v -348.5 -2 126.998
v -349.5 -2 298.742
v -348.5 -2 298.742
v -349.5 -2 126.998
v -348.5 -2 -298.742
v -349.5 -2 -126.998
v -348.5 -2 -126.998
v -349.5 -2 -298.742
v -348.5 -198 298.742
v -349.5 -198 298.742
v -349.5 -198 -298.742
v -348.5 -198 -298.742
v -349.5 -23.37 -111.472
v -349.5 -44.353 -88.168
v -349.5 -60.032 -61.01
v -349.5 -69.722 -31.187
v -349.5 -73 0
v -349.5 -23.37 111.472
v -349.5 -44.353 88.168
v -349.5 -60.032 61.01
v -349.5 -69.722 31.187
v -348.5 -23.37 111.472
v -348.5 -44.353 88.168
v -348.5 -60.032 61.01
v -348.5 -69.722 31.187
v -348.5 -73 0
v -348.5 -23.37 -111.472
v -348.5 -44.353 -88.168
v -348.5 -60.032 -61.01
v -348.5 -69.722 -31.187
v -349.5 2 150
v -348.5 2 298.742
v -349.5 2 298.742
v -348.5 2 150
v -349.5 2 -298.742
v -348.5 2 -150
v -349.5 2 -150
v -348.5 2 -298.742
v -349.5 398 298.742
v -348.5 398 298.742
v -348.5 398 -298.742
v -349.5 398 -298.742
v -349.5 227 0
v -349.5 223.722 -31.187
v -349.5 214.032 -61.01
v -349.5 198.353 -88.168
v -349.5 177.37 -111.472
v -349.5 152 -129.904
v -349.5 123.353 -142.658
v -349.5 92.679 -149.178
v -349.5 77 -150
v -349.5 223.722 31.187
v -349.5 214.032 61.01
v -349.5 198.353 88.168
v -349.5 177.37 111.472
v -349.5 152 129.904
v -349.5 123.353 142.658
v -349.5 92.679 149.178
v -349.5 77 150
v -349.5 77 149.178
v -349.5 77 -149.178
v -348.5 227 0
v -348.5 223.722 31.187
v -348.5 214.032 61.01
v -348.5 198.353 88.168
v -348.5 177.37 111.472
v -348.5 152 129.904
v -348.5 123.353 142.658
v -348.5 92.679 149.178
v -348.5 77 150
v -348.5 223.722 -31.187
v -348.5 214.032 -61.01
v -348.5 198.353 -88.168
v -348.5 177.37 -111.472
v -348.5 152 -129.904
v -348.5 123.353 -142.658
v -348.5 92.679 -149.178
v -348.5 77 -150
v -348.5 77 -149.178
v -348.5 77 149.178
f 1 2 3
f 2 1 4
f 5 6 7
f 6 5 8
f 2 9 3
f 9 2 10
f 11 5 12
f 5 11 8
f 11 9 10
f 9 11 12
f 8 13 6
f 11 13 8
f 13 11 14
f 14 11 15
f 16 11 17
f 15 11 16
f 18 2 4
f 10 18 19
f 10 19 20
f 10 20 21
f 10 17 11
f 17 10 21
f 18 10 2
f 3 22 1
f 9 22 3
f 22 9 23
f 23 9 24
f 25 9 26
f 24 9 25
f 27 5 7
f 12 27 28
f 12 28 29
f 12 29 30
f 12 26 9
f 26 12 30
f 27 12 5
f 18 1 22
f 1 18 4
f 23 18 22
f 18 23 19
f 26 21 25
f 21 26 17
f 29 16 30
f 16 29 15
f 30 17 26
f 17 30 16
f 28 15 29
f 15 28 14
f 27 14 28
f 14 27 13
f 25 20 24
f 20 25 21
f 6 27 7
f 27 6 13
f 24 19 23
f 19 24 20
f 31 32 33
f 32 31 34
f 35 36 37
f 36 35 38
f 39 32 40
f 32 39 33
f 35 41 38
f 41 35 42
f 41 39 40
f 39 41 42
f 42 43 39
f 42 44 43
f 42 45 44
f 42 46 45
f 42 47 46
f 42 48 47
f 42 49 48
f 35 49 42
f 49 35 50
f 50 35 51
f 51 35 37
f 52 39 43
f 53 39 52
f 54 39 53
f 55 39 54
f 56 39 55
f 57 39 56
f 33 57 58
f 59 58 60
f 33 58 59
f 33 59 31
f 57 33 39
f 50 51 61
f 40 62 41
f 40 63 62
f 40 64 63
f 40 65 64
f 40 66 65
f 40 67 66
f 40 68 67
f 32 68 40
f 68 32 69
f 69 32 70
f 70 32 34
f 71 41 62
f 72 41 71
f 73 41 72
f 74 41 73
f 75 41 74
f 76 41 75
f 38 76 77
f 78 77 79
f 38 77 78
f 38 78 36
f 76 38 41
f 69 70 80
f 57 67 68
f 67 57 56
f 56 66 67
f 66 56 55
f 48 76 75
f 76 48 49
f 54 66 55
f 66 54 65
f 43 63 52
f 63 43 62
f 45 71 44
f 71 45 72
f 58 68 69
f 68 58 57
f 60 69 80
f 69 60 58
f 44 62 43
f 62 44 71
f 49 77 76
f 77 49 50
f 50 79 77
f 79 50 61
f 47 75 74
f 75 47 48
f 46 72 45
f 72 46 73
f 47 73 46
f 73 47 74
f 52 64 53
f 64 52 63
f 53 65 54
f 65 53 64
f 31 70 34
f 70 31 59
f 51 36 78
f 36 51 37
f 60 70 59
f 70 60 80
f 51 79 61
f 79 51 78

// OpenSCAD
// file: parameters.scad
cm = 10;

//The dimensions of all other components depend on those of the square absorbers
square_absorber_height=9.8*cm;
square_absorber_width=9.6*cm;
square_absorber_thickness=2*cm;

square_absorber_horizontal_gap=0.4*cm;
square_absorber_vertical_gap=0.1897*cm;
square_absorber_longitudinal_gap=0.34*cm;

// holes in the square absorbers, cblocks, and master plates for placing connector pins.  
conn_hole_spacing=5*cm;
conn_hole_depth=1*cm;
conn_hole_radius=0.25*cm;

// BPC total dimensions
bpc_length=150*cm;
bpc_first_hole_radius=15.00*cm;
bpc_last_hole_radius=17.25*cm;
bpc_layer_thickness=square_absorber_thickness+square_absorber_longitudinal_gap;
//bpc_nlayers=floor(bpc_length/bpc_layer_thickness);
bpc_nlayers=51;
function bpc_hole_radius(i)=bpc_first_hole_radius+(bpc_last_hole_radius-bpc_first_hole_radius)*i/(bpc_nlayers-1);
bpc_outer_gap=0.4*cm;

tanBeamTilt=0.0243;
beamXAtUpstream=7.7*cm;
function bpc_hole_position(i)=tanBeamTilt*i*bpc_layer_thickness+beamXAtUpstream;

nsquaresX=3;



//scintillator
scint_thickness=0.3*cm;
scint_height=square_absorber_height*6+5*square_absorber_vertical_gap;
scint_width=square_absorber_width*nsquaresX+nsquaresX*square_absorber_horizontal_gap-bpc_outer_gap;
scint_inner_gap=square_absorber_horizontal_gap/2;



//cells in scintillator (also defines placement of sensors on pcb)
scint_cell_center_min_distance_from_edge=.35*cm;
scint_cell_dphi=9; //degrees
scint_cell_dr=2.5*cm;

//pcb
//pcb_thickness=.236*cm;
pcb_thickness=.16*cm;
pcb_height=square_absorber_height*6+5*square_absorber_vertical_gap;
pcb_width=square_absorber_width*nsquaresX+nsquaresX*square_absorber_horizontal_gap-bpc_outer_gap;
pcb_inner_gap=square_absorber_horizontal_gap/2;

// ESR film
ESR_film_thickness=0.015*cm;

//air gap
air_gap_thickness=0.02*cm;

//cover
cover_thickness=0.2*cm;
cover_height=square_absorber_height*6+5*square_absorber_vertical_gap;
cover_width=square_absorber_width*nsquaresX+nsquaresX*square_absorber_horizontal_gap-bpc_outer_gap;
cover_inner_gap=square_absorber_horizontal_gap/2;

//cblock
cblock_thickness=bpc_layer_thickness-pcb_thickness-scint_thickness-2*air_gap_thickness-2*ESR_film_thickness-cover_thickness;
cblock_height=square_absorber_height*6+5*square_absorber_vertical_gap;
cblock_width=square_absorber_width*nsquaresX+nsquaresX*square_absorber_horizontal_gap-bpc_outer_gap;
cblock_inner_gap=square_absorber_horizontal_gap/2;


//longitudinal positions of the first layer
cblock_position=cblock_thickness/2;
cover_position=cblock_thickness+air_gap_thickness+cover_thickness/2;
scint_position=cblock_thickness+air_gap_thickness+cover_thickness+ESR_film_thickness+scint_thickness/2;
pcb_position=cblock_thickness+air_gap_thickness+cover_thickness+ESR_film_thickness+scint_thickness+ESR_film_thickness+pcb_thickness/2;
echo(cblock_thickness);
// main file
include<parameters.scad>

ecal_height=pcb_height;
ecal_width=pcb_width;
ecal_inner_gap=pcb_inner_gap;

wscfi_thickness=17*cm;
wscfi_position=-wscfi_thickness/2;

lightguides_thickness=2.5*cm;
lightguides_position=-wscfi_thickness-lightguides_thickness/2;

lightguides_thickness=2.5*cm;
lightguides_position=-wscfi_thickness-lightguides_thickness/2;

//0.1 cm Al + 10.15 cm air + .25 cm PCB
ecal_pcb_thickness=0.25*cm;
ecal_pcb_position=lightguides_position-lightguides_thickness/2-ecal_pcb_thickness/2;

ecal_air_thickness=10.15*cm;
ecal_air_position=ecal_pcb_position-ecal_air_thickness/2-ecal_air_thickness/2;

ecal_cover_thickness=0.1*cm;
ecal_cover_position=ecal_air_position-ecal_air_thickness/2-ecal_cover_thickness/2;

module ecal_component_side(hole_radius=bpc_hole_radius(0),thickness=17*cm, height=pcb_height, width=ecal_width,inner_gap=ecal_inner_gap, holePosition=bpc_hole_position(0))
{   
    epsilon=0.1*cm;
    sipm_width=0.6*cm;
    sipm_height=0.6*cm;
    sipm_depth=0.1*cm;
    rotate([0,0,90]) difference() {
        union(){
            
            diagonal=sqrt(height*height/4+width*width);
            //board
            difference() {
                translate([-width/2-inner_gap, 0, 0]) cube([width, thickness, height],center= true);
                rotate([90,0,0]) translate([holePosition, 0, 0]) cylinder(h=thickness*1.5, r=hole_radius,center=true);
                translate([holePosition/2,0, 0]) cube([abs(holePosition), thickness*1.5,2*hole_radius], true);
                
            }
        }
        
        
    }
}

module ecal_component(hole_radius=bpc_hole_radius(0),thickness=17*cm, height=pcb_height, width=ecal_width,inner_gap=ecal_inner_gap, holePosition=bpc_hole_position(0)){
    ecal_component_side(width=width-100, thickness=thickness, height=height, hole_radius=hole_radius, inner_gap=inner_gap, holePosition=holePosition);
    mirror([0,1,0]) ecal_component_side(holePosition=-holePosition,width=width+100,thickness=thickness, height=height, inner_gap=inner_gap, hole_radius=hole_radius
    );
}


component="wscfi";
component="cover";

if (component=="wscfi")
    translate([wscfi_position,0,0])  ecal_component(thickness=wscfi_thickness);
else if (component=="lightguides")
    translate([lightguides_position,0,0])  ecal_component(thickness=lightguides_thickness);
else if (component=="pcb")
    translate([ecal_pcb_position,0,0])  ecal_component(thickness=ecal_pcb_thickness);
else if (component=="air")
    translate([ecal_air_position,0,0])  ecal_component(thickness=ecal_air_thickness);
else if (component=="cover")
    translate([ecal_cover_position,0,0])  ecal_component(thickness=ecal_cover_thickness);
